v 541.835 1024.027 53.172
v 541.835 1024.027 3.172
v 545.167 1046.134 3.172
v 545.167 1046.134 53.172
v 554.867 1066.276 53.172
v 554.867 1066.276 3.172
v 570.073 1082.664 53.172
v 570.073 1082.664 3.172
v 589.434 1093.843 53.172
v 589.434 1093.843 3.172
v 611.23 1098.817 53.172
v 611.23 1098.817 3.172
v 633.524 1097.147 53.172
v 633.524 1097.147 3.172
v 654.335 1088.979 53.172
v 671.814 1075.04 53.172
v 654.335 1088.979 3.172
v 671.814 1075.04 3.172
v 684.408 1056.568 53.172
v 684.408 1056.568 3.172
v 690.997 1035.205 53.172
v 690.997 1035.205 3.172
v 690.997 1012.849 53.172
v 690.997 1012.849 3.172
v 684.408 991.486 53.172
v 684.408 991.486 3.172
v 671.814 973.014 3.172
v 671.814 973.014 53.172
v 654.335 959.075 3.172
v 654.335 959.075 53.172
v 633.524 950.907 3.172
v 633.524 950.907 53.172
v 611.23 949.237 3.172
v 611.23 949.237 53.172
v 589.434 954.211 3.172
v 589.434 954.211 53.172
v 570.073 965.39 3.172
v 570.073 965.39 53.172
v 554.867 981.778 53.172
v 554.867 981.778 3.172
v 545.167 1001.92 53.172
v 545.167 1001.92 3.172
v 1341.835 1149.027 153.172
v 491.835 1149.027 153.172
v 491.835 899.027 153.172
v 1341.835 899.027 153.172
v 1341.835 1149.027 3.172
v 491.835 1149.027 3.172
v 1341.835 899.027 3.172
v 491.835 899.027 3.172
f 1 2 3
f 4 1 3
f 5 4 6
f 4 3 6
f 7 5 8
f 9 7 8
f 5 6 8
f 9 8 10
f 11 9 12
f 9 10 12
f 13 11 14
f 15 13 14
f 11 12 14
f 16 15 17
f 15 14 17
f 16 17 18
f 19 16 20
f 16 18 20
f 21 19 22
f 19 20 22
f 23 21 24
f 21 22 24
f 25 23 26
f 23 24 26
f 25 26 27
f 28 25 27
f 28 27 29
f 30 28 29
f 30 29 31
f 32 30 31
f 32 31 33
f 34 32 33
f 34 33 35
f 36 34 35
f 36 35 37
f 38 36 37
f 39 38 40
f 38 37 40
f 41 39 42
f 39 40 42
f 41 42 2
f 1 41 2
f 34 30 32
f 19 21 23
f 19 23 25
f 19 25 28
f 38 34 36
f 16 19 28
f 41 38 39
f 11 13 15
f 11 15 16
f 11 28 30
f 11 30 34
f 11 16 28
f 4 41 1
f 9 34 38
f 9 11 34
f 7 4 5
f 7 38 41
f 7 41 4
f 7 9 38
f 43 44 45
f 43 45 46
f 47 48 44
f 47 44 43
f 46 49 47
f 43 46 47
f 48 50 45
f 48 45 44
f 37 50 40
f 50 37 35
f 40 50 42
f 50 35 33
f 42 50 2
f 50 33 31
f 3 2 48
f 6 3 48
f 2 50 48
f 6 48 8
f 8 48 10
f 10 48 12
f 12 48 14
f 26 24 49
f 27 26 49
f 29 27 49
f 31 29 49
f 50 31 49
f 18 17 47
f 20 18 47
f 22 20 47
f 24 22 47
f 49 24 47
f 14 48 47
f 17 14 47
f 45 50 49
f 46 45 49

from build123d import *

# Parameters (mm, degrees)
CROQUIS2_W              = 850
CROQUIS2_H              = 250
SALIENTE_EXTRUIR1_DEPTH = 150
CROQUIS3_R              = 75
CORTAR_EXTRUIR1_DEPTH   = 50


with BuildPart() as part:
    # Croquis2 → Saliente-Extruir1 (new body)
    with BuildSketch(Plane.XY.offset(3.171613416)):
        with Locations((916.834843653, 1024.026997685)):
            Rectangle(CROQUIS2_W, CROQUIS2_H)
    extrude(amount=SALIENTE_EXTRUIR1_DEPTH)

    # Croquis3 → Cortar-Extruir1 (cut)
    with BuildSketch(Plane(origin=(0, 0, 3.171613416), x_dir=(-1, 0, 0), z_dir=(0, 0, -1))):
        with Locations((-616.834843653, 1024.026997685)):
            Circle(CROQUIS3_R)
    extrude(amount=-CORTAR_EXTRUIR1_DEPTH, mode=Mode.SUBTRACT)


solid = part.part
